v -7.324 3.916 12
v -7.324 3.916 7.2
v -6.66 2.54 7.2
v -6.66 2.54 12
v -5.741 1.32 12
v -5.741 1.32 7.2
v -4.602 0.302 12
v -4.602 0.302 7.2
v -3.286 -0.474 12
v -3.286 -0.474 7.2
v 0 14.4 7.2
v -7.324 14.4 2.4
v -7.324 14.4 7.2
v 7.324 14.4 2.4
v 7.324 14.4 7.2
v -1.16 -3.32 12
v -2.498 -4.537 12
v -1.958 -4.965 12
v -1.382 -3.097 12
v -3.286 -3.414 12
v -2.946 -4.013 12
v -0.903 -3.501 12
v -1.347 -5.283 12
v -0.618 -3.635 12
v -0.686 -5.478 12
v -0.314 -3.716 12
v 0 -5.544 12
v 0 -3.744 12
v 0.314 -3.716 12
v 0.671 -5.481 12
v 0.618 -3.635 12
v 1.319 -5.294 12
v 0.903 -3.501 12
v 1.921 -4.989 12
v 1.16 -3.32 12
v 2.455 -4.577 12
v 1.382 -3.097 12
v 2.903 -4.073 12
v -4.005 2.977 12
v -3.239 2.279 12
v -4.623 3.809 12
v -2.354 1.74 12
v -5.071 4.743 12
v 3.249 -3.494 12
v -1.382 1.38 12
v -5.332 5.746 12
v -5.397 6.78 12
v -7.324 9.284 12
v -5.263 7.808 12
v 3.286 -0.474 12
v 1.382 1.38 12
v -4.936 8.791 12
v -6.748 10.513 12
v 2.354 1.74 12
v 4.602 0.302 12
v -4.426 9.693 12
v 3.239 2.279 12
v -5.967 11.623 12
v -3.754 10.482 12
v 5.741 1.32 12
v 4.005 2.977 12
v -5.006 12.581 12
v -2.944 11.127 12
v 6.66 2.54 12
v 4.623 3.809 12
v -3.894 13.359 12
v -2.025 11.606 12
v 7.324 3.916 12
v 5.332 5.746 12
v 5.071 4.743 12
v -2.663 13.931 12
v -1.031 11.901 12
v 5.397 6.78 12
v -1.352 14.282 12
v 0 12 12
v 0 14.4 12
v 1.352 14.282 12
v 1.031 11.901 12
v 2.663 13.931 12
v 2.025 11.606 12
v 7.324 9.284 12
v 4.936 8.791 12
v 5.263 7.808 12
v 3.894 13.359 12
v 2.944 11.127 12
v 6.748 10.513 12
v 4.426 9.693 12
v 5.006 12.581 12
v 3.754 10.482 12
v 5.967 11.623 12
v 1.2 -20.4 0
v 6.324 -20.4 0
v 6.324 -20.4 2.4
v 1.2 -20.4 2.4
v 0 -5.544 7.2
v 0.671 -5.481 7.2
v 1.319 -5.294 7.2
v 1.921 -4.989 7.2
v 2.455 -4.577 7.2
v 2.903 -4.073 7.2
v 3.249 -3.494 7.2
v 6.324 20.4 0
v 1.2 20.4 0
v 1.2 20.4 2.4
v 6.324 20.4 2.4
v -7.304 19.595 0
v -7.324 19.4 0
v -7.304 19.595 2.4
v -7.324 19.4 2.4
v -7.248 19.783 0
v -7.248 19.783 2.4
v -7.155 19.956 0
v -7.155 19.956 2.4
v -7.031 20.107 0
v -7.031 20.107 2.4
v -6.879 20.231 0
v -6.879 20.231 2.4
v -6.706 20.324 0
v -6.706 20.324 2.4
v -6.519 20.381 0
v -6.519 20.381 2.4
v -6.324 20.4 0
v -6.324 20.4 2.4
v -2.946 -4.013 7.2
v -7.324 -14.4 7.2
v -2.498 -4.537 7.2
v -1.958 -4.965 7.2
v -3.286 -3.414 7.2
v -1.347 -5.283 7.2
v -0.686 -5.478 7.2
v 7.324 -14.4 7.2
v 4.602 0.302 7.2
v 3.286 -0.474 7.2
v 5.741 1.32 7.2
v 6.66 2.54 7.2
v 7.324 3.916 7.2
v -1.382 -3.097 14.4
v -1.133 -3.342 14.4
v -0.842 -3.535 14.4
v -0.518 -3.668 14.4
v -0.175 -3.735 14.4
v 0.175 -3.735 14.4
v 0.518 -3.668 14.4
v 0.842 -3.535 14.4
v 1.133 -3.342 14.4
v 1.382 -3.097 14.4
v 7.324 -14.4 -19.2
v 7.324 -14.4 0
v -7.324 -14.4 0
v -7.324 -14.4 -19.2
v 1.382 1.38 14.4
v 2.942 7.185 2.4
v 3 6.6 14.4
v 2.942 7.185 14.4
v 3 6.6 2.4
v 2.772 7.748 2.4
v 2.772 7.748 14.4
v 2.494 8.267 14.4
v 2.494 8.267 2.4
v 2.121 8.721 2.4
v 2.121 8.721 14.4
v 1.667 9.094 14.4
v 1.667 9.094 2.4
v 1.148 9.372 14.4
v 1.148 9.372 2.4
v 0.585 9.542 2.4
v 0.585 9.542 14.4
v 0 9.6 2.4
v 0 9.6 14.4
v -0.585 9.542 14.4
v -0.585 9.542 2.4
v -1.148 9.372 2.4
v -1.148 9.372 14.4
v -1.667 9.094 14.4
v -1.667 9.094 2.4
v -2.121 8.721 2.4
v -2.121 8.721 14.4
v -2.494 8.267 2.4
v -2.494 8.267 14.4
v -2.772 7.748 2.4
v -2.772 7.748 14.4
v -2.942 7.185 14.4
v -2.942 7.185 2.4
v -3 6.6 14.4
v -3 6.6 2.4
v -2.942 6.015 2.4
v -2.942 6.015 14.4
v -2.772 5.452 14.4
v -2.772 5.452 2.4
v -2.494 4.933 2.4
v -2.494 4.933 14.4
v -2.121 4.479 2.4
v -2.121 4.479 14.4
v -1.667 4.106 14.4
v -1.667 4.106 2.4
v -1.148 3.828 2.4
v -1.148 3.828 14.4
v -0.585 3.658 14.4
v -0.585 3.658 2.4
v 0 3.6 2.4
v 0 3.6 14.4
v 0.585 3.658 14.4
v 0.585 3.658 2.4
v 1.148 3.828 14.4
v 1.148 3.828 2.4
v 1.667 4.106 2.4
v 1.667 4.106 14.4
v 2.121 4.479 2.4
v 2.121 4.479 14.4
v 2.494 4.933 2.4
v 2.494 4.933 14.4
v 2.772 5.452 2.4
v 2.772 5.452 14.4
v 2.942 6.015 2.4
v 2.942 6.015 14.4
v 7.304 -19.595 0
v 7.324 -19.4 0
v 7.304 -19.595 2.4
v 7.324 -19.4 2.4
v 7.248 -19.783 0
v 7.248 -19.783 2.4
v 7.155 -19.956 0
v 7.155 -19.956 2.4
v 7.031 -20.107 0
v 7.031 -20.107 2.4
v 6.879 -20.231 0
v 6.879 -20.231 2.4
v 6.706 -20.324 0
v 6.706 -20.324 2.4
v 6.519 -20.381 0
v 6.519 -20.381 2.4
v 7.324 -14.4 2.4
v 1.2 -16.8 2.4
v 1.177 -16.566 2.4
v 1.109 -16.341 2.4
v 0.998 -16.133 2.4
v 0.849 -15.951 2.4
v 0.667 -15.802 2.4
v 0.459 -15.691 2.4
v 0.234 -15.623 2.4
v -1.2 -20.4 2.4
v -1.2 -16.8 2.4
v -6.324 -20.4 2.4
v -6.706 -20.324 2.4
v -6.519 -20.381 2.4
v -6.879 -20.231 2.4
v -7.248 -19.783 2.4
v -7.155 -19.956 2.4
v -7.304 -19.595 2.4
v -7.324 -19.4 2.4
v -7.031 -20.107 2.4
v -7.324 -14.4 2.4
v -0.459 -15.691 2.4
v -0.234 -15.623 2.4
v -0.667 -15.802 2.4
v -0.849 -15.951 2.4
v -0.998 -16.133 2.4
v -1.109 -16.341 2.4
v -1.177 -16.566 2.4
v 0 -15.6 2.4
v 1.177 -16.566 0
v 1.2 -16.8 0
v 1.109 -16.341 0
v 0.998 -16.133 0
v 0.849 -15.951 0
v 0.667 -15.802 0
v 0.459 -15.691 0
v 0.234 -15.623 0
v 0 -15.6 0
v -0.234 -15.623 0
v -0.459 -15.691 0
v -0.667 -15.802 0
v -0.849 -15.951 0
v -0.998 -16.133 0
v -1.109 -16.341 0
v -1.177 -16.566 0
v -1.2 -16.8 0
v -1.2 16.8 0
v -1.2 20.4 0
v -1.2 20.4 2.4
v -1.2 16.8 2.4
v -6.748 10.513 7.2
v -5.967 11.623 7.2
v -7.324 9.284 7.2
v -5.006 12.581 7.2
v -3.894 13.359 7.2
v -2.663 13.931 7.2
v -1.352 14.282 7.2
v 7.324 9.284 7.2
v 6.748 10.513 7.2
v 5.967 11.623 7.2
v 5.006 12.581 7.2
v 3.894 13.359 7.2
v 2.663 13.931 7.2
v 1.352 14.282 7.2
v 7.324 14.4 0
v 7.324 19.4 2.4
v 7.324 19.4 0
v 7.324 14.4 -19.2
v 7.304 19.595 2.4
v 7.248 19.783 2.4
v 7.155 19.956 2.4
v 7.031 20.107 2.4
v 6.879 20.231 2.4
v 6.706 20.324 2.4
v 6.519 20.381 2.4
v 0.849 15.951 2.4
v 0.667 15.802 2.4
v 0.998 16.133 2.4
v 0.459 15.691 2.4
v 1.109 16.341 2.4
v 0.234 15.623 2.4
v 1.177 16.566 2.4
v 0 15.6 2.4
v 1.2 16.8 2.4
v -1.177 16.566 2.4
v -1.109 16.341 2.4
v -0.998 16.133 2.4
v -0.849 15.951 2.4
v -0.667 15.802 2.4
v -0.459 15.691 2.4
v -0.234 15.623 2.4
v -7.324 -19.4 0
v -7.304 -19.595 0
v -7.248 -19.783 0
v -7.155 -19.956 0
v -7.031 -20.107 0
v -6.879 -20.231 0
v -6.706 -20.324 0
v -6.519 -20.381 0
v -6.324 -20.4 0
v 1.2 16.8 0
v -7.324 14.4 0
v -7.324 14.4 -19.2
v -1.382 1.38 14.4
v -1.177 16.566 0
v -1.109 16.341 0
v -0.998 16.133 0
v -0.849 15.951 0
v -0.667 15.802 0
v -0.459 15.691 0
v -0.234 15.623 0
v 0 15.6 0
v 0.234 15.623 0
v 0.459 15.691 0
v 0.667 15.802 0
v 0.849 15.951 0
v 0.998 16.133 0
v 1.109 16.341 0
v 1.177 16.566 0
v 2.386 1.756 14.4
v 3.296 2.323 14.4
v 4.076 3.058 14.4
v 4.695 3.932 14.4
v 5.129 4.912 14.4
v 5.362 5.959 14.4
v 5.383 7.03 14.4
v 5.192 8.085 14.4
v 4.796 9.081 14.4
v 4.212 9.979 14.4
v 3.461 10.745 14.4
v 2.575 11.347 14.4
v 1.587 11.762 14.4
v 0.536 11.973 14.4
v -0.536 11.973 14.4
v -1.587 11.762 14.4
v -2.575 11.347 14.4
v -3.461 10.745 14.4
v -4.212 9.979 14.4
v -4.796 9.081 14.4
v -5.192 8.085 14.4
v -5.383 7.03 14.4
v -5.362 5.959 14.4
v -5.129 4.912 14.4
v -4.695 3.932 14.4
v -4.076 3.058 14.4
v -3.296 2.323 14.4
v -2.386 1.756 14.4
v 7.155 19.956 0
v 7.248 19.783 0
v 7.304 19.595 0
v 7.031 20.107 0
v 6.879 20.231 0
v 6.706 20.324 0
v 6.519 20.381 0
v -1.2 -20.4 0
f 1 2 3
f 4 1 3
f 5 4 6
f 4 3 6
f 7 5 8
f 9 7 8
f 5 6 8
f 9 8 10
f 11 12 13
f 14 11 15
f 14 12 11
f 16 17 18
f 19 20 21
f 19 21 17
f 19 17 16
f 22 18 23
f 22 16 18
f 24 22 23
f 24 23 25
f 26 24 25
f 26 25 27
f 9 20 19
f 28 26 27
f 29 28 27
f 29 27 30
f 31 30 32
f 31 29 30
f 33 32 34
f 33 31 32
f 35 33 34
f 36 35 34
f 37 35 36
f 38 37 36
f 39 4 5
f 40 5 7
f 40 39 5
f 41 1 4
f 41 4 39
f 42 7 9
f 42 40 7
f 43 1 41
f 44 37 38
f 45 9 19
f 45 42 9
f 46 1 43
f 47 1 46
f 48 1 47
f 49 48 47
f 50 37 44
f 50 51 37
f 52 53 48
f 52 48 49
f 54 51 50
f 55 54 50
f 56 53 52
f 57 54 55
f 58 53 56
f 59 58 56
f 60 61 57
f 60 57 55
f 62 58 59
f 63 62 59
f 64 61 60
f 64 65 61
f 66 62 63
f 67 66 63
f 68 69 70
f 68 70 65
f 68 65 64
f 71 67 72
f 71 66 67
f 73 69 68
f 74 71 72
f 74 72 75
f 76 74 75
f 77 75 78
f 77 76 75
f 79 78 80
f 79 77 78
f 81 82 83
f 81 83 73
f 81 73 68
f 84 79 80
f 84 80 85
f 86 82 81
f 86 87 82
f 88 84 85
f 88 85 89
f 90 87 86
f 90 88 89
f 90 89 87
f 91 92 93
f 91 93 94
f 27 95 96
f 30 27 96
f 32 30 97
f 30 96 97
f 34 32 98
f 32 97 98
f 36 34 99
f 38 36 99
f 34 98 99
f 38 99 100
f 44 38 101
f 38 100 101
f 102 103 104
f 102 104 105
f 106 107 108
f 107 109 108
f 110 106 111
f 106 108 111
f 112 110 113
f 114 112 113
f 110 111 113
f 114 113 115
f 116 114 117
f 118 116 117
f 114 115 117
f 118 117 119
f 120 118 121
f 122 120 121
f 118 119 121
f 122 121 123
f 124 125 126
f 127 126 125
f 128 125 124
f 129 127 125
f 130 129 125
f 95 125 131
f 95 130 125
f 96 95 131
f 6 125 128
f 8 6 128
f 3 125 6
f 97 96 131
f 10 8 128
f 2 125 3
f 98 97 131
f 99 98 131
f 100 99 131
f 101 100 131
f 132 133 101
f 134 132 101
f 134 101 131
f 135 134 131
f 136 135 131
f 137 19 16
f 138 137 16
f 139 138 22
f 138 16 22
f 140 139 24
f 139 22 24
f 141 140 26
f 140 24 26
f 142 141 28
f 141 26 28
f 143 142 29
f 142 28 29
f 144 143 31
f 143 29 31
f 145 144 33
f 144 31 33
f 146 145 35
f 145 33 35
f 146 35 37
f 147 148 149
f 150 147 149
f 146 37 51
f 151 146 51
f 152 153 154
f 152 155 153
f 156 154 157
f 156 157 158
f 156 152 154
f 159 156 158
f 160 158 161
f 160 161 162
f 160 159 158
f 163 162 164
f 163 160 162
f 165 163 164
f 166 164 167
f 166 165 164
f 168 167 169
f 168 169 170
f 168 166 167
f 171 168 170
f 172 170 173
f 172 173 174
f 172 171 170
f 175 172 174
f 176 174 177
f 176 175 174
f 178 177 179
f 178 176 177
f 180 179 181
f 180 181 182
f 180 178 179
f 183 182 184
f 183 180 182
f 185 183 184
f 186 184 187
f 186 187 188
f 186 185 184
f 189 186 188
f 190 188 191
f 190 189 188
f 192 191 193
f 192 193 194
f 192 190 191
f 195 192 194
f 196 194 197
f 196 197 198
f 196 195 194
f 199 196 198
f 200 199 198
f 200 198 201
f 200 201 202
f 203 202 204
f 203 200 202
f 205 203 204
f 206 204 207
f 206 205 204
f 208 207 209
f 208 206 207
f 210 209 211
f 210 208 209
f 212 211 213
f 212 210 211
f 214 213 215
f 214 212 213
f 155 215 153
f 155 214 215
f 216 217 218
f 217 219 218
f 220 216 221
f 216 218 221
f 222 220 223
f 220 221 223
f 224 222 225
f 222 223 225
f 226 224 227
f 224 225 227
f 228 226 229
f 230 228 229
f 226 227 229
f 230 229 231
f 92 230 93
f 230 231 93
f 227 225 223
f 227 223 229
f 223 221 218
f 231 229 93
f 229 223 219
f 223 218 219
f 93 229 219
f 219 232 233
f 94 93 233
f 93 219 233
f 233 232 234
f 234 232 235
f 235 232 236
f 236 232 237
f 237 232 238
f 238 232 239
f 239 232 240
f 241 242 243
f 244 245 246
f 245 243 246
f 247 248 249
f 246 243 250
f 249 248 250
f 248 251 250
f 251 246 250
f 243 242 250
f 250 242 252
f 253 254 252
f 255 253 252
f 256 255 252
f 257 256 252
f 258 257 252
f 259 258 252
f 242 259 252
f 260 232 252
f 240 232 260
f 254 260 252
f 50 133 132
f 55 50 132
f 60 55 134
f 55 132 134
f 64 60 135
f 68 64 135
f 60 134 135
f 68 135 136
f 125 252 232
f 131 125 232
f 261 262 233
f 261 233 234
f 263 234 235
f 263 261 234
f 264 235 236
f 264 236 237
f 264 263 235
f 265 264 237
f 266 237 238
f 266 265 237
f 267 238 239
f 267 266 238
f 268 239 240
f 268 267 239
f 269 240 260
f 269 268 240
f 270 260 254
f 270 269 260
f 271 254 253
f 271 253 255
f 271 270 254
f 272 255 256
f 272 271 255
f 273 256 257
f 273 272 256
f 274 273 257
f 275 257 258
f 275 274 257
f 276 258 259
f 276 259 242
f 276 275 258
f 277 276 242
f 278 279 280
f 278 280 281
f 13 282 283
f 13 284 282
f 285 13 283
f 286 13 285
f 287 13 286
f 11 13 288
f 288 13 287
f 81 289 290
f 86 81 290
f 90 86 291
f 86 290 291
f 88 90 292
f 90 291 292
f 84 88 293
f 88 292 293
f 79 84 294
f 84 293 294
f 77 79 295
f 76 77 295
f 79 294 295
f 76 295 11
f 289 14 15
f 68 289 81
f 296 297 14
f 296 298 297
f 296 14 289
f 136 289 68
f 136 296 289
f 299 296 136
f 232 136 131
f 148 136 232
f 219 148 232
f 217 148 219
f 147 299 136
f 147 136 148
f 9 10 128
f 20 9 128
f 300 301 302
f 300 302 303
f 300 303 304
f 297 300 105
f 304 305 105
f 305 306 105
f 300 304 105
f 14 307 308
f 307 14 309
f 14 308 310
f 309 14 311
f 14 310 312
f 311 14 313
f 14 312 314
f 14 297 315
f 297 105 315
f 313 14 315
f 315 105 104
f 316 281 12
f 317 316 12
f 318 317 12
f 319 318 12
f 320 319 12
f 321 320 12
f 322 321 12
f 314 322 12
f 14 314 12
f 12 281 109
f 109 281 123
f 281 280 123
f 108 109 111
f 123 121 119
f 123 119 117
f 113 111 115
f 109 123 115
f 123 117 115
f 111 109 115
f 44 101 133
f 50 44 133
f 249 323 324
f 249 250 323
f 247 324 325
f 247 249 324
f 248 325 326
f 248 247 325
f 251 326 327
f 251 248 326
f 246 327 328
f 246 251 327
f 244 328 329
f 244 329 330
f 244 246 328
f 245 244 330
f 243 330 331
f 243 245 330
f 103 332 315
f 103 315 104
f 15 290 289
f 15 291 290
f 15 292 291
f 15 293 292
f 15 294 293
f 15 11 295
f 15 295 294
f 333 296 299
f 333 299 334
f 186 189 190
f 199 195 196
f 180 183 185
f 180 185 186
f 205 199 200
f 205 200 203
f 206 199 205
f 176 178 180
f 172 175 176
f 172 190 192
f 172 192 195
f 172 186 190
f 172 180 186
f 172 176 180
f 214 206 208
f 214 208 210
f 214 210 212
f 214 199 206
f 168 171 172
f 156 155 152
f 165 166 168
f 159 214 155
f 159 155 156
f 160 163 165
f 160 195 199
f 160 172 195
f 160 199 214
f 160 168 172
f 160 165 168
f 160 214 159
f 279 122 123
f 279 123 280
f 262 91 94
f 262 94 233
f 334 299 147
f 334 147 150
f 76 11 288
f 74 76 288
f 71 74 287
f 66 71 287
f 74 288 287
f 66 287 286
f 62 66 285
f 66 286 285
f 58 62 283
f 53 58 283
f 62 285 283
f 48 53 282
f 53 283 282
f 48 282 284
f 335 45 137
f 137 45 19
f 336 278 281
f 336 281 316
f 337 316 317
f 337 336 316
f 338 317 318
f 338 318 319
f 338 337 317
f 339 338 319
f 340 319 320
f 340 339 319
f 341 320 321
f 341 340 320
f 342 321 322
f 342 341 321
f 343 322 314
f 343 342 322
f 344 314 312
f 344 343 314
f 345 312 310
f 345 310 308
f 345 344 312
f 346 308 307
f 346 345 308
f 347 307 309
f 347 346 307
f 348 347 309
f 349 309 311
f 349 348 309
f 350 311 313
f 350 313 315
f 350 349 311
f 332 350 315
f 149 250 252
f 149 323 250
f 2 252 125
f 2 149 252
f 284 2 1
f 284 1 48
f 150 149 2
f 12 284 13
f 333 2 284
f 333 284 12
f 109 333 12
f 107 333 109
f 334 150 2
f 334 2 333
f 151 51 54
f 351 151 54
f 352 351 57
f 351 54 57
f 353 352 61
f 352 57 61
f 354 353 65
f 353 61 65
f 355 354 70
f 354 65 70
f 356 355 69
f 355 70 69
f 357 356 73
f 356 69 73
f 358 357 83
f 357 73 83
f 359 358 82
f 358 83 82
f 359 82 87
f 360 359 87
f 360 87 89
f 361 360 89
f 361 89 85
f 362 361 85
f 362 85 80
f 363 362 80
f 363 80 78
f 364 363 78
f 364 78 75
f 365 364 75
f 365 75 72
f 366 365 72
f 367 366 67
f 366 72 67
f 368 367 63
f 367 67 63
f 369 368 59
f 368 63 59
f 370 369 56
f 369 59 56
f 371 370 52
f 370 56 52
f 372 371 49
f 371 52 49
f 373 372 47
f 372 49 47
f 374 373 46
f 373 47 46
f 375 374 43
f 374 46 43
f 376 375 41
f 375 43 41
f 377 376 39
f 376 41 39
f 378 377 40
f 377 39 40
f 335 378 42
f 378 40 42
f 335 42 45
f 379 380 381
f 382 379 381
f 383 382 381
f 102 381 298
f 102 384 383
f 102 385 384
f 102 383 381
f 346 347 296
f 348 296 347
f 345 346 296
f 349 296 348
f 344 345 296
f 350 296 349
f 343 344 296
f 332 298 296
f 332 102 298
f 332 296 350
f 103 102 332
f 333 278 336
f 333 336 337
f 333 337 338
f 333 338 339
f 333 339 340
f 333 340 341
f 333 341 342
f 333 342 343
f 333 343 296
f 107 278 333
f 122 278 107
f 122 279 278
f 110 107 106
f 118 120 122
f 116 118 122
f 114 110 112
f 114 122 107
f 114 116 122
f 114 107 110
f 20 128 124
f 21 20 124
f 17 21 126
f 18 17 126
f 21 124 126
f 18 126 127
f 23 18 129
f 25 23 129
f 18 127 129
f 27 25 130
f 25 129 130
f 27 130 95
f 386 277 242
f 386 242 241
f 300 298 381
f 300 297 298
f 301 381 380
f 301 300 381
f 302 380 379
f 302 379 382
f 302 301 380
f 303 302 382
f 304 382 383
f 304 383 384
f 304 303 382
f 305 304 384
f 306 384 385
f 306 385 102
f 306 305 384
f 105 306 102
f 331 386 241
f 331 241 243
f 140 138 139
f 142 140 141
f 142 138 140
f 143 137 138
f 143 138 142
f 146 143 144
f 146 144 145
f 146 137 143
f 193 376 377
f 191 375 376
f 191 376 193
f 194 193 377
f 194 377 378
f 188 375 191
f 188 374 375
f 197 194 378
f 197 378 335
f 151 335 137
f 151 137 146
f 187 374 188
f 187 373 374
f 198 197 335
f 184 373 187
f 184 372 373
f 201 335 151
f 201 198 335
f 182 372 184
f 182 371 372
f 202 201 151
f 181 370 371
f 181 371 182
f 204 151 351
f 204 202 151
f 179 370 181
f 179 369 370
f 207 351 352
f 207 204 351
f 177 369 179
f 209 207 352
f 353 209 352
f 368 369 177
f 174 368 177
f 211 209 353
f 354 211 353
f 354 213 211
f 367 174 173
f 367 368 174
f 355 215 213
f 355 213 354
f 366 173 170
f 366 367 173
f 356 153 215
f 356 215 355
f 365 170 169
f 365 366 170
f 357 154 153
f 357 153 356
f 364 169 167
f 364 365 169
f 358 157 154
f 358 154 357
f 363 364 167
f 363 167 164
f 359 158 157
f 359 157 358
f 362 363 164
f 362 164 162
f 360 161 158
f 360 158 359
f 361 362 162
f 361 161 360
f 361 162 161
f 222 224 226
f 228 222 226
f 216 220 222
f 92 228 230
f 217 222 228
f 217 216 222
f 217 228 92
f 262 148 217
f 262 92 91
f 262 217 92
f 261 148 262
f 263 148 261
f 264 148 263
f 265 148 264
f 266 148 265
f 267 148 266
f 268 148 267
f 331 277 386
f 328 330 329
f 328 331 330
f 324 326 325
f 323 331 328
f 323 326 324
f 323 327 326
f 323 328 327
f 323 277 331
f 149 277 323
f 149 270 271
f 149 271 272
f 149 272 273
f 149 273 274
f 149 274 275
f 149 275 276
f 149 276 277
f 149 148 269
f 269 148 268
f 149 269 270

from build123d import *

# Parameters (mm, degrees)
BOSS_EXTRU_2_DEPTH      = 2.4
ESQUISSE3_W             = 14.64741017
ESQUISSE3_H             = 28.8
BOSS_EXTRU_3_DEPTH      = 4.8
BOSS_EXTRU_4_DEPTH      = 4.8
ESQUISSE7_R             = 3
BOSS_EXTRU_5_DEPTH      = 7.2
ENL_V_START             = -4.8
ESQUISSE8_R             = 3
ENL_V_MAT_EXTRU_1_DEPTH = 4.8
ESQUISSE9_W             = 14.64741017
ESQUISSE9_H             = 28.8
BOSS_EXTRU_6_DEPTH      = 19.2
CONG_1_R                = 1


with BuildPart() as part:
    # Esquisse1 → Boss.-Extru.2 (new body)
    with BuildSketch(Plane.XY):
        with BuildLine():
            Line((-7.323705085, 20.4), (-1.2, 20.4))
            Line((-1.2, 20.4), (-1.2, 16.8))
            ThreePointArc((-1.2, 16.8), (0, 15.6), (1.2, 16.8))
            Line((1.2, 16.8), (1.2, 20.4))
            Line((1.2, 20.4), (7.323705085, 20.4))
            Line((7.323705085, 20.4), (7.323705085, -20.4))
            Line((7.323705085, -20.4), (1.2, -20.4))
            Line((1.2, -20.4), (1.2, -16.8))
            ThreePointArc((1.2, -16.8), (0, -15.6), (-1.2, -16.8))
            Line((-1.2, -16.8), (-1.2, -20.4))
            Line((-1.2, -20.4), (-7.323705085, -20.4))
            Line((-7.323705085, -20.4), (-7.323705085, 20.4))
        make_face()
    extrude(amount=BOSS_EXTRU_2_DEPTH)

    # Esquisse3 → Boss.-Extru.3 (add)
    with BuildSketch(Plane.XY.offset(2.4)):
        Rectangle(ESQUISSE3_W, ESQUISSE3_H)
    extrude(amount=BOSS_EXTRU_3_DEPTH)

    # Esquisse4 → Boss.-Extru.4 (add)
    with BuildSketch(Plane.XY.offset(7.2)):
        with BuildLine():
            Line((0, 12), (0, 14.4))
            ThreePointArc((8e-09, 14.4), (-4.466852593, 12.994312153), (-7.323705085, 9.283904587))
            Line((-7.323705085, 9.283904587), (-7.323705085, 3.916095413))
            ThreePointArc((-7.323705085, 3.916095413), (-5.741131727, 1.319904689), (-3.286183333, -0.473966292))
            Line((-3.286183333, -0.473966292), (-3.286183333, -3.414033708))
            ThreePointArc((-3.286183333, -3.414033708), (-1.958044771, -4.964937052), (0, -5.544))
            Line((0, -5.544), (0, -3.744))
            ThreePointArc((0, -3.744), (-0.763253879, -3.574166714), (-1.382478965, -3.096715017))
            Line((-1.382478965, -3.096715017), (-1.382478965, 1.379966292))
            ThreePointArc((-1.382478965, 1.379966292), (-5.354819419, 7.297071724), (0, 12))
        make_face()
        with BuildLine():
            ThreePointArc((7.323705085, 9.283904587), (4.466852599, 12.994312149), (8e-09, 14.4))
            Line((0, 14.4), (0, 12))
            ThreePointArc((0, 12), (5.354819419, 7.297071724), (1.382478965, 1.379966292))
            Line((1.382478965, 1.379966292), (1.382478965, -3.096715017))
            ThreePointArc((1.382478965, -3.096715017), (0.763253879, -3.574166714), (0, -3.744))
            Line((0, -3.744), (0, -5.544))
            ThreePointArc((0, -5.544), (1.920803148, -4.988752086), (3.249094107, -3.49428626))
            Line((3.249094107, -3.49428626), (3.286183333, -0.473966292))
            ThreePointArc((3.286183333, -0.473966292), (5.741131727, 1.319904689), (7.323705085, 3.916095413))
            Line((7.323705085, 3.916095413), (7.323705085, 9.283904587))
        make_face()
    extrude(amount=BOSS_EXTRU_4_DEPTH)

    # Esquisse7 → Boss.-Extru.5 (add)
    with BuildSketch(Plane.XY.offset(7.2)):
        with BuildLine():
            Line((-1.382478965, 1.379966292), (-1.382478965, -3.096715017))
            ThreePointArc((-1.382478965, -3.096715017), (0, -3.744), (1.382478965, -3.096715017))
            Line((1.382478965, -3.096715017), (1.382478965, 1.379966292))
            ThreePointArc((1.382478965, 1.379966292), (0, 12), (-1.382478965, 1.379966292))
        make_face()
        with Locations((0, 6.6)):
            Circle(ESQUISSE7_R, mode=Mode.SUBTRACT)
    extrude(amount=BOSS_EXTRU_5_DEPTH)

    # Esquisse8 → Enlèv. mat.-Extru.1 (cut)
    with BuildSketch(Plane.XY.offset(7.2).offset(ENL_V_START)):
        with Locations((0, 6.6)):
            Circle(ESQUISSE8_R)
    extrude(amount=ENL_V_MAT_EXTRU_1_DEPTH, mode=Mode.SUBTRACT)

    # Esquisse9 → Boss.-Extru.6 (add)
    with BuildSketch(Plane(origin=(0, 0, 0), x_dir=(-1, 0, 0), z_dir=(0, 0, -1))):
        Rectangle(ESQUISSE9_W, ESQUISSE9_H)
    extrude(amount=BOSS_EXTRU_6_DEPTH)

    # Congé1
    cong_1_edges = [part.edges().sort_by_distance(p)[0] for p in [
        (7.323705085, 20.4, 1.2),
        (7.323705085, -20.4, 1.2),
        (-7.323705085, -20.4, 1.2),
        (-7.323705085, 20.4, 1.2),
    ]]
    fillet(cong_1_edges, radius=CONG_1_R)


solid = part.part
